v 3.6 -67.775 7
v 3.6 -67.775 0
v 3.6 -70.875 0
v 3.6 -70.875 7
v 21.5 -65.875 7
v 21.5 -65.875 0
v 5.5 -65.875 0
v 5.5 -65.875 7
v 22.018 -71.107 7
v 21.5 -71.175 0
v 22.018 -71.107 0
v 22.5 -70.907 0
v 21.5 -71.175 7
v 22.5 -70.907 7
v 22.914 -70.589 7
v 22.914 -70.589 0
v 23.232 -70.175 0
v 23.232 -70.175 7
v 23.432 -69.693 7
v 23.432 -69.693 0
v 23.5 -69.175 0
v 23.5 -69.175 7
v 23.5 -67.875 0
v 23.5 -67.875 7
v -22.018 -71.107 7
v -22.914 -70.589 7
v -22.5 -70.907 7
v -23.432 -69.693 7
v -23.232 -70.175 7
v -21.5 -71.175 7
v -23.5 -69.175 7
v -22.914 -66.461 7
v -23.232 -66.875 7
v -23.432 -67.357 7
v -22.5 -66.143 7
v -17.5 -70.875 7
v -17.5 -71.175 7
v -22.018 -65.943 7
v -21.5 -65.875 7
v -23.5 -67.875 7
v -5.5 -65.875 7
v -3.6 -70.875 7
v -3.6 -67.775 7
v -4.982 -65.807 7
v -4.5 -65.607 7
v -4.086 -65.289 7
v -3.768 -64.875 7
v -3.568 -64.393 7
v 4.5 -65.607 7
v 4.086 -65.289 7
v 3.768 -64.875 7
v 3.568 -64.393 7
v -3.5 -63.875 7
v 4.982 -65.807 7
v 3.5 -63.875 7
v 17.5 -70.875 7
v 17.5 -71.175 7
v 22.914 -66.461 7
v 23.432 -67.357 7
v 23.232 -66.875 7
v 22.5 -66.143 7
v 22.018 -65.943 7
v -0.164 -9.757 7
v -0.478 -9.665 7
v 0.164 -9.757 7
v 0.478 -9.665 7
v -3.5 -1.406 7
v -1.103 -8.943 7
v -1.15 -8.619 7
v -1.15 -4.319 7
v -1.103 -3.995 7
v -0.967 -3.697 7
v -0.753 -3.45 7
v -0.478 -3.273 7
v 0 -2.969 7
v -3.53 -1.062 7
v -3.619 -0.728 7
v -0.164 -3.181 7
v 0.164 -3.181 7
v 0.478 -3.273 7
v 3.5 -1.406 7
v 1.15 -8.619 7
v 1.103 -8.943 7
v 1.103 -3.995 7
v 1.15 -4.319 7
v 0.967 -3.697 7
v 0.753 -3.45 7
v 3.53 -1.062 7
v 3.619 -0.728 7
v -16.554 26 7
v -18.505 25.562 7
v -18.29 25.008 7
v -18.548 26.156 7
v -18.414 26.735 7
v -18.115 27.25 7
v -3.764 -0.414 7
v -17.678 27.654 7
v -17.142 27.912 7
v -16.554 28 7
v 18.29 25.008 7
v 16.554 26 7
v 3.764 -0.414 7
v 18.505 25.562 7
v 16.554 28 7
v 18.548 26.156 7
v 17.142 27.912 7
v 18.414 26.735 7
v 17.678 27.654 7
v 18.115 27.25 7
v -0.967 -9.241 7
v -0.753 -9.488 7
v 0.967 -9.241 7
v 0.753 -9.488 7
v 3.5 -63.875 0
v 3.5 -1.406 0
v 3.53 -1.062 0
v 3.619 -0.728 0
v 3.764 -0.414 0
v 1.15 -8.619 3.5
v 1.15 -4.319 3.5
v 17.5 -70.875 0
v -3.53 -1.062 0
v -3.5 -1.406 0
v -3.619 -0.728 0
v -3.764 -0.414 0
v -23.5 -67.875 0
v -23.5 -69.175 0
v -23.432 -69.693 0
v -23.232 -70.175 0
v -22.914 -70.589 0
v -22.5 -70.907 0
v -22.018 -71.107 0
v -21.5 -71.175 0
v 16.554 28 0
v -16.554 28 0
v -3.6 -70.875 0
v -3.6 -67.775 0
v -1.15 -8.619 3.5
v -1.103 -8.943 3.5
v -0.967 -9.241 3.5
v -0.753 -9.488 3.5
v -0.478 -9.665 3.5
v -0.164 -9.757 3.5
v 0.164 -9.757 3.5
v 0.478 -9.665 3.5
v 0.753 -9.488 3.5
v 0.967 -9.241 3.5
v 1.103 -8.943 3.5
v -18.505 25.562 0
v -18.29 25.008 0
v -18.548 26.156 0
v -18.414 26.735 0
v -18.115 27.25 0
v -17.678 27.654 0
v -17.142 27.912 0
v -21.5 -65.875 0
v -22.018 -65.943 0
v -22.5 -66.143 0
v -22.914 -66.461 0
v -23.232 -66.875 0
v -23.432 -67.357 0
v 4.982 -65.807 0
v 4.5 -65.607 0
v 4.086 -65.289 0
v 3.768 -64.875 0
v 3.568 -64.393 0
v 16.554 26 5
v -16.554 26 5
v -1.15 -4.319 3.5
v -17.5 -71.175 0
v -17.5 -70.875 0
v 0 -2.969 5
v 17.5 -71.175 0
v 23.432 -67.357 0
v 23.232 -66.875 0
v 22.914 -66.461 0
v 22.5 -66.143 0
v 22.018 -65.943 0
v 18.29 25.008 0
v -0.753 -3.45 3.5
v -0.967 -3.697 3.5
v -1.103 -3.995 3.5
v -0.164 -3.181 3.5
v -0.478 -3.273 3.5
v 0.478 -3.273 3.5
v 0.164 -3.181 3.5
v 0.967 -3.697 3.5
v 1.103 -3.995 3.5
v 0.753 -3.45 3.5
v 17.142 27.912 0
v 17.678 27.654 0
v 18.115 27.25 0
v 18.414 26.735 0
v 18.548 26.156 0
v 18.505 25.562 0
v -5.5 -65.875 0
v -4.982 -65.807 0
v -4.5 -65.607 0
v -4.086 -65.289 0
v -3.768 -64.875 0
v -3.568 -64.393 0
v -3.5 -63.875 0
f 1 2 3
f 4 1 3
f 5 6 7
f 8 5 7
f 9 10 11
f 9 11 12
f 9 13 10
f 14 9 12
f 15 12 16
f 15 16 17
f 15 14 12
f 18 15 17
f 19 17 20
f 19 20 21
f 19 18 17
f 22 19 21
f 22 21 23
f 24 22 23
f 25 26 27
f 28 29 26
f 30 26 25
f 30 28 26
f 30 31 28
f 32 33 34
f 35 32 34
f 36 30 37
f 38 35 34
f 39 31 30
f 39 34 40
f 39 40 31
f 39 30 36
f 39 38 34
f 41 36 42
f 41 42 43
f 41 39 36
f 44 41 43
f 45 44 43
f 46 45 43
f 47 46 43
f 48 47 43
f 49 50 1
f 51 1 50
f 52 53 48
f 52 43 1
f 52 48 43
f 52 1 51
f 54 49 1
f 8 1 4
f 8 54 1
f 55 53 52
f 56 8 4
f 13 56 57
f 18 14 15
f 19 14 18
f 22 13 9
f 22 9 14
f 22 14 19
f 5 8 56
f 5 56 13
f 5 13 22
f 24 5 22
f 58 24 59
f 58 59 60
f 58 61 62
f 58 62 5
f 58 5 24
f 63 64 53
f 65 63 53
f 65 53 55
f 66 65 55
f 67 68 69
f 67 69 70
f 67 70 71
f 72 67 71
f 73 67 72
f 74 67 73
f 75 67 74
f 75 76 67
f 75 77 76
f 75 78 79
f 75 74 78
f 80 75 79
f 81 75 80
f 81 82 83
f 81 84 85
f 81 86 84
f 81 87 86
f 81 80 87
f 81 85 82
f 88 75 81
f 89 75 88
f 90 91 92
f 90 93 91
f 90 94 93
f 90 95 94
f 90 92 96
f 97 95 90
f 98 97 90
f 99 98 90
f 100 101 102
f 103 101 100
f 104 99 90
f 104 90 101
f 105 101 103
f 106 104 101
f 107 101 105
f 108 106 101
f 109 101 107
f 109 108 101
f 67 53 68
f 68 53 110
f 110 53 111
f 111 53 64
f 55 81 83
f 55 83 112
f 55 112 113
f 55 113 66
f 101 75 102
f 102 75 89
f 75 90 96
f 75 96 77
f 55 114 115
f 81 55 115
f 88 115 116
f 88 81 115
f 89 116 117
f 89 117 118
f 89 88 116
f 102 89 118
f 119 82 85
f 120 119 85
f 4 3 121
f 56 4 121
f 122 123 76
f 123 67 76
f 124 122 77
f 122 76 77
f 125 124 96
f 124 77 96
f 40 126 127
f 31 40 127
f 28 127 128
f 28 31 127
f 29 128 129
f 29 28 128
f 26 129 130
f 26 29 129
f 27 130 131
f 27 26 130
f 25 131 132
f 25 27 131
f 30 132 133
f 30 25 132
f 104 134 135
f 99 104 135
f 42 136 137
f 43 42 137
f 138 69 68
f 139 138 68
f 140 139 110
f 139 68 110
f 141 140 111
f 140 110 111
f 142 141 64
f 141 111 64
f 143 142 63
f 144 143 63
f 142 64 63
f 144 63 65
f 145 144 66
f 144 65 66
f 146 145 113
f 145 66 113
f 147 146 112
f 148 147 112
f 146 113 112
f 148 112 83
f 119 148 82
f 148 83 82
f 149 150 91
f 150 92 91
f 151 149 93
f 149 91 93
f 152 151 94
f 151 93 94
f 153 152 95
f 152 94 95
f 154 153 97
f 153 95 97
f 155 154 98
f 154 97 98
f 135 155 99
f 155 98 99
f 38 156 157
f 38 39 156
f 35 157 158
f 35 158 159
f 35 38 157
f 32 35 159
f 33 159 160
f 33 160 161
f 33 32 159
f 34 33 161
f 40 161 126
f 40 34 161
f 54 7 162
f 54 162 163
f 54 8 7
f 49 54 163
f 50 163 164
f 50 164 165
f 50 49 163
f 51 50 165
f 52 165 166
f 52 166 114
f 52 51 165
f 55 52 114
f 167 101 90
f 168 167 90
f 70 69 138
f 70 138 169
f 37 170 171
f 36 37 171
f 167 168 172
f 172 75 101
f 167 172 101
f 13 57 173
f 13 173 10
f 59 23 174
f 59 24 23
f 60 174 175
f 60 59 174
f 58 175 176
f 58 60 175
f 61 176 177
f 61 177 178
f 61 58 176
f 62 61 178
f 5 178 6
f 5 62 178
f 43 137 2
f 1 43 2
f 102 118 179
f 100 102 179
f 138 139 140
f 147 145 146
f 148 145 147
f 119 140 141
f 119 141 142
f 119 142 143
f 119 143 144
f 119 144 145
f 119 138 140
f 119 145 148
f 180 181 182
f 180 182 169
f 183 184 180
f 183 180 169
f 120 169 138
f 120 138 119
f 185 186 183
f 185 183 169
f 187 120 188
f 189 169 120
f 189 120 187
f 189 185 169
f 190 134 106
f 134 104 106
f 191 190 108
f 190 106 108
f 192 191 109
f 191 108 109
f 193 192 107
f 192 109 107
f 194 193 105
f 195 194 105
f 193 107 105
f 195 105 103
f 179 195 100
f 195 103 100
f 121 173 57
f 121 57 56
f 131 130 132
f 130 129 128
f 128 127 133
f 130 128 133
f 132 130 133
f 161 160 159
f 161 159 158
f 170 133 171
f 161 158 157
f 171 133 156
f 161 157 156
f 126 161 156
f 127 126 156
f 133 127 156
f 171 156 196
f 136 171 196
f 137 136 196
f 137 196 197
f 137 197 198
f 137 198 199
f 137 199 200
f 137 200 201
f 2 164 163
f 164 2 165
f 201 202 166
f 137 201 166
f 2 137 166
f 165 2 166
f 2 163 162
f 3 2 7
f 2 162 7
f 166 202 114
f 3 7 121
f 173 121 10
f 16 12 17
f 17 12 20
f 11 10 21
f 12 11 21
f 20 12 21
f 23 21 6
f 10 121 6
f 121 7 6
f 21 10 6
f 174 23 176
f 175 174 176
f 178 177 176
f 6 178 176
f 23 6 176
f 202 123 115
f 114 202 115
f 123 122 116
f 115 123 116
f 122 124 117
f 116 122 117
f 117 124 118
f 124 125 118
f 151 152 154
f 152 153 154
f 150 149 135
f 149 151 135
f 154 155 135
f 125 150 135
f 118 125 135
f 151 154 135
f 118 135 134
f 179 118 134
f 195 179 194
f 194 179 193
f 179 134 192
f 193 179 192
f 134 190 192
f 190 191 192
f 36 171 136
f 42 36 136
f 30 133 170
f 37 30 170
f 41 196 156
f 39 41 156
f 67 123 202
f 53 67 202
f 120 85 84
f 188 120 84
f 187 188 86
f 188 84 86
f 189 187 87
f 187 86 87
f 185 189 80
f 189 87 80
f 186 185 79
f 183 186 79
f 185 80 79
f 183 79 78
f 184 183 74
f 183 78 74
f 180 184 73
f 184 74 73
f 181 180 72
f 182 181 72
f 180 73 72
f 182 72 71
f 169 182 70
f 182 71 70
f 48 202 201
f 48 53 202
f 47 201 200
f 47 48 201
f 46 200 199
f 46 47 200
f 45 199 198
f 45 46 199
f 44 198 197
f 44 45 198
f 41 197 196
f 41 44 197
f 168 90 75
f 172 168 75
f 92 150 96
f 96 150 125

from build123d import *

# Parameters (mm, degrees)
F0_W     = 6
F0_H     = 0.3
F1_DEPTH = 7
F3_DEPTH = 2
F4_R     = 2
F5_W     = 2.3
F5_H     = 4.3
F6_DEPTH = 3.5


# Not quite as in the source:
# - a feature names something its author has since deleted; it is built from what else it names


with BuildPart() as f1:
    # F0 (on Top) → F1 (new body)
    with BuildSketch(Plane.XY):
        Polygon((0, -7), (-3.5, -0.875), (-3.5, -65.875), (-23.5, -65.875), (-23.5, -70.875), (-17.5, -70.875), (-3.6, -70.875), (-3.6, -67.775), (3.6, -67.775), (3.6, -70.875), (17.5, -70.875), (23.5, -70.875), (23.5, -65.875), (3.5, -65.875), (3.5, -0.875), align=None)
        with Locations((-20.5, -71.025)):
            Rectangle(F0_W, F0_H)
        with Locations((20.5, -71.025)):
            Rectangle(F0_W, F0_H)
        Polygon((-20, 28), (-3.5, -0.875), (0, -7), (3.5, -0.875), (20, 28), align=None)
    extrude(amount=F1_DEPTH)

    # F2 (on face) → F3 (cut)
    with BuildSketch(Plane.XY.offset(7)):
        Polygon((16.5536406433, 26), (-16.5536406433, 26), (0, -2.9688711259), align=None)
    extrude(amount=-F3_DEPTH, mode=Mode.SUBTRACT)

    # F4
    f4_edges = [f1.edges().sort_by_distance(p)[0] for p in [
        (3.5, -65.875, 3.5),
        (-3.5, -65.875, 3.5),
        (-23.5, -65.875, 3.5),
        (23.5, -65.875, 3.5),
        (-23.5, -71.175, 3.5),
        (23.5, -71.175, 3.5),
        (-20, 28, 3.5),
        (20, 28, 3.5),
        (-3.5, -0.875, 3.5),
        (3.5, -0.875, 3.5),
    ]]
    fillet(f4_edges, radius=F4_R)

    # F5 (on face) → F6 (cut)
    with BuildSketch(Plane.XY.offset(7)):
        with BuildLine():
            ThreePointArc((-1.15, -8.6188711259), (0, -9.7688711259), (1.15, -8.6188711259))
            Line((1.15, -8.6188711259), (-1.15, -8.6188711259))
        make_face()
        with Locations((0, -6.4688711259)):
            Rectangle(F5_W, F5_H)
        with BuildLine():
            Line((-1.15, -4.3188711259), (1.15, -4.3188711259))
            ThreePointArc((1.15, -4.3188711259), (0, -3.1688711259), (-1.15, -4.3188711259))
        make_face()
    extrude(amount=-F6_DEPTH, mode=Mode.SUBTRACT)


solid = f1.part
